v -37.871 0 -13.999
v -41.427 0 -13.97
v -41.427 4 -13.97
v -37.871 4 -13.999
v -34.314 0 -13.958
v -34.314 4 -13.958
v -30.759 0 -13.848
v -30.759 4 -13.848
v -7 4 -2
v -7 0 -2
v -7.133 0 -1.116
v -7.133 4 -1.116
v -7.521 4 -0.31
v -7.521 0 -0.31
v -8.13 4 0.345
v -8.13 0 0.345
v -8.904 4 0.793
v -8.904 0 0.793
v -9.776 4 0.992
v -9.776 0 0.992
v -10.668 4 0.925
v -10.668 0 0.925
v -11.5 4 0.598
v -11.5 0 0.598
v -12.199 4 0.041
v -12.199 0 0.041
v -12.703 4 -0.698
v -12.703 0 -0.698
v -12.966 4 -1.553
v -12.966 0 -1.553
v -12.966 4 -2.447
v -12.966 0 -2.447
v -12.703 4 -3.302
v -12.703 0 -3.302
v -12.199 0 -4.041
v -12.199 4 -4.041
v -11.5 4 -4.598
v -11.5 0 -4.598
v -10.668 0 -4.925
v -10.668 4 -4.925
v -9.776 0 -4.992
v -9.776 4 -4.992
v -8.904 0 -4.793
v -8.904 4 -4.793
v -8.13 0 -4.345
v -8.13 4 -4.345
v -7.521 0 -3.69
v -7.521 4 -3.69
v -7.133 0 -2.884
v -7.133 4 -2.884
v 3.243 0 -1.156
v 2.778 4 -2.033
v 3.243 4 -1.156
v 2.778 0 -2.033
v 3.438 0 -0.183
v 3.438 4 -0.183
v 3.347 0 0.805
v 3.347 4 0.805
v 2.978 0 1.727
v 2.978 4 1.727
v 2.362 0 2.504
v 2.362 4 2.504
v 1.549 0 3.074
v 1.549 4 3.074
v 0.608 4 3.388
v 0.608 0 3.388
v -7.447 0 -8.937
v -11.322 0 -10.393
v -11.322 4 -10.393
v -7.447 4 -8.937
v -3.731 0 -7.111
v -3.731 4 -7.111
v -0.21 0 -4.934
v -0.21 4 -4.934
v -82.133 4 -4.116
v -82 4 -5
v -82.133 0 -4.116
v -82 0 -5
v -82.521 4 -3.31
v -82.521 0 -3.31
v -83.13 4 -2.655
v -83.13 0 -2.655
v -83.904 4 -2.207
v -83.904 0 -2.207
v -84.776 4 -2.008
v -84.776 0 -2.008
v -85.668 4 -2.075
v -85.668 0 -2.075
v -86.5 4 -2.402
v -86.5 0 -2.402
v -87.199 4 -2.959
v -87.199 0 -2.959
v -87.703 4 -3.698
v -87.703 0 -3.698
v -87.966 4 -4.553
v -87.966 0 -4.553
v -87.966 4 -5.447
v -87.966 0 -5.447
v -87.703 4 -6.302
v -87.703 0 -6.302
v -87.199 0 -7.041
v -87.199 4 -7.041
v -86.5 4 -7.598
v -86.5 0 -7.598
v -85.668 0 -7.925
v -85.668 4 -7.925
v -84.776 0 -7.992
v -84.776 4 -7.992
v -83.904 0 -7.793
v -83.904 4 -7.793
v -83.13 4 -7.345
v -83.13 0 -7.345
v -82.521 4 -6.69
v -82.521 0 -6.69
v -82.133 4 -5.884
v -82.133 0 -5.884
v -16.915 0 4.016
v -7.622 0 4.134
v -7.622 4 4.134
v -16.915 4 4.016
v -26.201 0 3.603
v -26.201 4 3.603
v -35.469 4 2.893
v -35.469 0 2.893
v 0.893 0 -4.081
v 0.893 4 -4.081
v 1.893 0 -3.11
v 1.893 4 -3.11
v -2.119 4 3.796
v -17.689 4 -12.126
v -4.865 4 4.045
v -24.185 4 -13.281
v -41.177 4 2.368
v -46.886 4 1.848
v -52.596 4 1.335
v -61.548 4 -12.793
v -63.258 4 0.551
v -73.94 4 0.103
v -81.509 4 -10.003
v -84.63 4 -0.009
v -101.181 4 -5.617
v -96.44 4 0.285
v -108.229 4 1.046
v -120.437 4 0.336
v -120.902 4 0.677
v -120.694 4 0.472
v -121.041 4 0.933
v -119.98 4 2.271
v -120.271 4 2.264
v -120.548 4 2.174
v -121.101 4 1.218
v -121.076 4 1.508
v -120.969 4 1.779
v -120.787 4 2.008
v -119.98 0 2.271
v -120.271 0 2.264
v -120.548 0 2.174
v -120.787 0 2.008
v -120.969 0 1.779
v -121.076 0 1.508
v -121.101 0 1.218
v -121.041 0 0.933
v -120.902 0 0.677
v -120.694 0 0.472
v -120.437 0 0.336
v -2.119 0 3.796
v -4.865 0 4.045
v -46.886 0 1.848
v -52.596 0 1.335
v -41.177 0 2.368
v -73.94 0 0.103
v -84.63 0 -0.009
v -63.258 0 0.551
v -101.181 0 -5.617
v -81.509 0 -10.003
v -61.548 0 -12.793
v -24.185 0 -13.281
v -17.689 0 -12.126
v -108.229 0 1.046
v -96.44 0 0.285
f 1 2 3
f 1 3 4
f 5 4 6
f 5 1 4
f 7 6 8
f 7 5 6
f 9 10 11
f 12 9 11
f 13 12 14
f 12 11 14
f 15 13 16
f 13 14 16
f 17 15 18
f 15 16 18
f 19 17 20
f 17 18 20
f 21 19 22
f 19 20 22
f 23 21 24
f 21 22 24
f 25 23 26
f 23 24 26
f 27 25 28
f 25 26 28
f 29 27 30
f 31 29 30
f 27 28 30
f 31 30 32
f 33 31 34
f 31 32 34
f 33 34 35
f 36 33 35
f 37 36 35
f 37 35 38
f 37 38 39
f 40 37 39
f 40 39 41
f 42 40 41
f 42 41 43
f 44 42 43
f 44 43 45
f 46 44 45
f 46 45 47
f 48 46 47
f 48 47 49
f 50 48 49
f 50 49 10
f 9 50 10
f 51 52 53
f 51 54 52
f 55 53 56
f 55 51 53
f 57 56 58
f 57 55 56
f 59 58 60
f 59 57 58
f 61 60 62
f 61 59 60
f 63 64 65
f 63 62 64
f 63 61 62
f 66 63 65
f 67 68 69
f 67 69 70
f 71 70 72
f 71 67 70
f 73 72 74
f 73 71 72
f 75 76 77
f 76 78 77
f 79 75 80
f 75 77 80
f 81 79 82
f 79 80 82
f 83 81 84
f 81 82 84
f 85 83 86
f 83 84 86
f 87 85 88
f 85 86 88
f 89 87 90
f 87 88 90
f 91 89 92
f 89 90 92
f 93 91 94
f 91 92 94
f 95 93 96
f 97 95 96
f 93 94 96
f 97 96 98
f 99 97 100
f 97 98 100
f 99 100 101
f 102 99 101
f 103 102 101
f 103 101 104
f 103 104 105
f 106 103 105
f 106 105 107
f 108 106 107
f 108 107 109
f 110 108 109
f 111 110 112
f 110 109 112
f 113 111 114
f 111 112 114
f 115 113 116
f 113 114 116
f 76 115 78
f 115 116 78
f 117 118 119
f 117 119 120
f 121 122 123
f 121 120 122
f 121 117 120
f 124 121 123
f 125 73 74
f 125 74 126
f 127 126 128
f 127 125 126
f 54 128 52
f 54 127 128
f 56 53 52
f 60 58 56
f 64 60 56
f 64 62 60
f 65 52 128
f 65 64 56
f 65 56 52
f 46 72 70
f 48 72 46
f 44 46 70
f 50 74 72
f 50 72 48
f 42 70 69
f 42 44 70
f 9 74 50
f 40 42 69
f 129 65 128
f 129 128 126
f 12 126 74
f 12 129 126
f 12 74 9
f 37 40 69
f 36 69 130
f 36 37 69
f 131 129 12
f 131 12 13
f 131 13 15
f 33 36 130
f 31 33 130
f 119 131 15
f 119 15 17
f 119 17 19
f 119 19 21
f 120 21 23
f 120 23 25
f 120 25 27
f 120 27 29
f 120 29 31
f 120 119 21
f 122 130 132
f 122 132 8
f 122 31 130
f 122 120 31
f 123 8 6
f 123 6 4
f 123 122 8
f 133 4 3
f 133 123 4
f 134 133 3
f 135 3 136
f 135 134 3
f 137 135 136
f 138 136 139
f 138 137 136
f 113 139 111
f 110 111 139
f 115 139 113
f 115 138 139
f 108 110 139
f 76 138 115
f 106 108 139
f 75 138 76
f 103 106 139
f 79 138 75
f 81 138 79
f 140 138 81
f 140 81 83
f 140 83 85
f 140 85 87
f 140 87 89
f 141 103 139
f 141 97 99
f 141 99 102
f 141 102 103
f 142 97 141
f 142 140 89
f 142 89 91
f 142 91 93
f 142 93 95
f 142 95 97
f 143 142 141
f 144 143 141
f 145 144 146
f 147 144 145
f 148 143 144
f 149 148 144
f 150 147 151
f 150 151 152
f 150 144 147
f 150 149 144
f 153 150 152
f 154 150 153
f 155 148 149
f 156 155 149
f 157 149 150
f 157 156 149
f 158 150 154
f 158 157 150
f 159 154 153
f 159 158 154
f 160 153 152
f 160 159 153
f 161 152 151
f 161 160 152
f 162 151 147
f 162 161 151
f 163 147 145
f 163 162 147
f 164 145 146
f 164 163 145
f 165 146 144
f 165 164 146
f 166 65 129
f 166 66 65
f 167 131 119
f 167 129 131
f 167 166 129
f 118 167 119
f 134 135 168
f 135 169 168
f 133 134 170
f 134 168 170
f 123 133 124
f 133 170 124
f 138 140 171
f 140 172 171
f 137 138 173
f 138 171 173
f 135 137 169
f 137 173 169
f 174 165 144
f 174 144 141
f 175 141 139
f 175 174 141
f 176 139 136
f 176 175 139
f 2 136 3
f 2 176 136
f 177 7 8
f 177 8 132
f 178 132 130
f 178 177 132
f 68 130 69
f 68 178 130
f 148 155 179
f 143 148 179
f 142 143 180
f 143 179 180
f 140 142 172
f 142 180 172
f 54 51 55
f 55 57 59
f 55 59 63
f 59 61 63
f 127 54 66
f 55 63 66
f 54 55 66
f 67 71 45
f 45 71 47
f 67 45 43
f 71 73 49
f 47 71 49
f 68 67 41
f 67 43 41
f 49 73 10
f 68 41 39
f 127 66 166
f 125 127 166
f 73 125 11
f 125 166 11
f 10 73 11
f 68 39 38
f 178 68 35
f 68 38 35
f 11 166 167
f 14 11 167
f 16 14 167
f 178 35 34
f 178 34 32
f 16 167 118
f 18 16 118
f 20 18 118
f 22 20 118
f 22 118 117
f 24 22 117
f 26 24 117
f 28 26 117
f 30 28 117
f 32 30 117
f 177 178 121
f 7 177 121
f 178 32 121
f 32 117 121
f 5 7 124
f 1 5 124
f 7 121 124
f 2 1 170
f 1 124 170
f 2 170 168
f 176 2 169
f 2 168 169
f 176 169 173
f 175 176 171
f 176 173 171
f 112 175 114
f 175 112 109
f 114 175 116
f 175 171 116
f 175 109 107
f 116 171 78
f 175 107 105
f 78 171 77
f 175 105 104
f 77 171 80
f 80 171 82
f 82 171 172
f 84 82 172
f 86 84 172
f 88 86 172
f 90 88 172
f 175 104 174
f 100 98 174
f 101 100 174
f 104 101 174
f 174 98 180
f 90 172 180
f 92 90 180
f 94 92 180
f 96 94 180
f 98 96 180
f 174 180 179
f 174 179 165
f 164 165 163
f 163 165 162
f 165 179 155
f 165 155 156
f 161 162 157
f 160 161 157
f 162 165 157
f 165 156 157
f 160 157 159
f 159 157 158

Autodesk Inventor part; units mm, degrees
ref_plane "YZ Plane" through (0, 0, 0) normal (1, 0, 0) x (0, 1, 0)
ref_plane "XZ Plane" through (0, 0, 0) normal (0, 1, 0) x (-1, 0, 0)
ref_plane "XY Plane" through (0, 0, 0) normal (0, 0, 1) x (1, 0, 0)
sketch "スケッチ1" plane through (0, 0, 0) normal (0, 1, 0) x (-1, 0, 0)
  arc A0 (120.7701, -0.6068) -> (119.8564, 3.2634) centre (120.103, 1.2786) ccw projected
  arc A1 (41.4452, -14.9694) -> (120.7701, -0.6068) centre (36.8758, 236.5065) ccw projected
  arc A2 (30.7183, -14.8468) -> (41.4452, -14.9694) centre (38.1525, 166.2425) ccw projected
  arc A3 (11.0166, -11.3447) -> (30.7183, -14.8468) centre (33.77, 59.49) ccw projected
  arc A4 (-0.3565, -5.7585) -> (11.0166, -11.3447) centre (24.3575, 30.1875) ccw projected
  arc A5 (-3.5852, -2.6234) -> (-0.3565, -5.7585) centre (7.25, 5.305) ccw projected
  arc A6 (-0.7848, 4.3726) -> (-3.5852, -2.6234) centre (0, 0) ccw projected
  arc A7 (7.6183, 5.1344) -> (-0.7848, 4.3726) centre (7.775, -43.32) ccw projected
  arc A8 (35.5607, 3.8888) -> (7.6183, 5.1344) centre (8.565, -287.665) ccw projected
  arc A9 (35.5607, 3.8888) -> (52.6853, 2.3311) centre (526.9475, 5310.875) ccw projected
  arc A10 (52.6853, 2.3311) -> (84.6244, 0.9905) centre (82.86, 340.0849) ccw projected
  arc A11 (84.6244, 0.9905) -> (119.8564, 3.2634) centre (83.0725, 299.245) ccw projected
extrude "押し出し1" add sketch "スケッチ1" along normal blind 4
sketch "スケッチ2" plane through (0, 0, 0) normal (0, -1, 0) x (1, 0, 0)
  circle A0 centre (-10, -2) radius 3
  circle A1 centre (-85, -5) radius 3
  point P0 (0, 0)
  dimension "d3" = 6
  dimension "d4" = 6
  dimension "d5" = 10
  dimension "d6" = 2
  dimension "d7" = 5
  dimension "d8" = 85
extrude "押し出し2" cut sketch "スケッチ2" against normal through all
thicken "厚み1" operation cut thickness 1 both sides no extend neighbours no toward (-0.2771555, 0, 0.9608251) faces at (-13.1498, 2.6667, -11.9948) (-9.6787, 1.3333, -10.8909) (-35.4848, 2.6667, -14.9797) (-114.3801, 1.3333, -2.7717) (-121.1079, 2.6667, 3.0079) (0.7651, 1.3333, -5.4662) (1.1102, 2.6667, 4.3015) (-0.1407, 1.3333, 4.5295) (-23.1571, 2.6667, 4.7721) (-45.0737, 2.6667, 3.0166) (-70.4143, 2.6667, 1.2143) (-115.9582, 2.6667, 2.8049)
equation "\"d4\" = d3"
properties part number "plate_sf2" material "木材 (オーク)"
